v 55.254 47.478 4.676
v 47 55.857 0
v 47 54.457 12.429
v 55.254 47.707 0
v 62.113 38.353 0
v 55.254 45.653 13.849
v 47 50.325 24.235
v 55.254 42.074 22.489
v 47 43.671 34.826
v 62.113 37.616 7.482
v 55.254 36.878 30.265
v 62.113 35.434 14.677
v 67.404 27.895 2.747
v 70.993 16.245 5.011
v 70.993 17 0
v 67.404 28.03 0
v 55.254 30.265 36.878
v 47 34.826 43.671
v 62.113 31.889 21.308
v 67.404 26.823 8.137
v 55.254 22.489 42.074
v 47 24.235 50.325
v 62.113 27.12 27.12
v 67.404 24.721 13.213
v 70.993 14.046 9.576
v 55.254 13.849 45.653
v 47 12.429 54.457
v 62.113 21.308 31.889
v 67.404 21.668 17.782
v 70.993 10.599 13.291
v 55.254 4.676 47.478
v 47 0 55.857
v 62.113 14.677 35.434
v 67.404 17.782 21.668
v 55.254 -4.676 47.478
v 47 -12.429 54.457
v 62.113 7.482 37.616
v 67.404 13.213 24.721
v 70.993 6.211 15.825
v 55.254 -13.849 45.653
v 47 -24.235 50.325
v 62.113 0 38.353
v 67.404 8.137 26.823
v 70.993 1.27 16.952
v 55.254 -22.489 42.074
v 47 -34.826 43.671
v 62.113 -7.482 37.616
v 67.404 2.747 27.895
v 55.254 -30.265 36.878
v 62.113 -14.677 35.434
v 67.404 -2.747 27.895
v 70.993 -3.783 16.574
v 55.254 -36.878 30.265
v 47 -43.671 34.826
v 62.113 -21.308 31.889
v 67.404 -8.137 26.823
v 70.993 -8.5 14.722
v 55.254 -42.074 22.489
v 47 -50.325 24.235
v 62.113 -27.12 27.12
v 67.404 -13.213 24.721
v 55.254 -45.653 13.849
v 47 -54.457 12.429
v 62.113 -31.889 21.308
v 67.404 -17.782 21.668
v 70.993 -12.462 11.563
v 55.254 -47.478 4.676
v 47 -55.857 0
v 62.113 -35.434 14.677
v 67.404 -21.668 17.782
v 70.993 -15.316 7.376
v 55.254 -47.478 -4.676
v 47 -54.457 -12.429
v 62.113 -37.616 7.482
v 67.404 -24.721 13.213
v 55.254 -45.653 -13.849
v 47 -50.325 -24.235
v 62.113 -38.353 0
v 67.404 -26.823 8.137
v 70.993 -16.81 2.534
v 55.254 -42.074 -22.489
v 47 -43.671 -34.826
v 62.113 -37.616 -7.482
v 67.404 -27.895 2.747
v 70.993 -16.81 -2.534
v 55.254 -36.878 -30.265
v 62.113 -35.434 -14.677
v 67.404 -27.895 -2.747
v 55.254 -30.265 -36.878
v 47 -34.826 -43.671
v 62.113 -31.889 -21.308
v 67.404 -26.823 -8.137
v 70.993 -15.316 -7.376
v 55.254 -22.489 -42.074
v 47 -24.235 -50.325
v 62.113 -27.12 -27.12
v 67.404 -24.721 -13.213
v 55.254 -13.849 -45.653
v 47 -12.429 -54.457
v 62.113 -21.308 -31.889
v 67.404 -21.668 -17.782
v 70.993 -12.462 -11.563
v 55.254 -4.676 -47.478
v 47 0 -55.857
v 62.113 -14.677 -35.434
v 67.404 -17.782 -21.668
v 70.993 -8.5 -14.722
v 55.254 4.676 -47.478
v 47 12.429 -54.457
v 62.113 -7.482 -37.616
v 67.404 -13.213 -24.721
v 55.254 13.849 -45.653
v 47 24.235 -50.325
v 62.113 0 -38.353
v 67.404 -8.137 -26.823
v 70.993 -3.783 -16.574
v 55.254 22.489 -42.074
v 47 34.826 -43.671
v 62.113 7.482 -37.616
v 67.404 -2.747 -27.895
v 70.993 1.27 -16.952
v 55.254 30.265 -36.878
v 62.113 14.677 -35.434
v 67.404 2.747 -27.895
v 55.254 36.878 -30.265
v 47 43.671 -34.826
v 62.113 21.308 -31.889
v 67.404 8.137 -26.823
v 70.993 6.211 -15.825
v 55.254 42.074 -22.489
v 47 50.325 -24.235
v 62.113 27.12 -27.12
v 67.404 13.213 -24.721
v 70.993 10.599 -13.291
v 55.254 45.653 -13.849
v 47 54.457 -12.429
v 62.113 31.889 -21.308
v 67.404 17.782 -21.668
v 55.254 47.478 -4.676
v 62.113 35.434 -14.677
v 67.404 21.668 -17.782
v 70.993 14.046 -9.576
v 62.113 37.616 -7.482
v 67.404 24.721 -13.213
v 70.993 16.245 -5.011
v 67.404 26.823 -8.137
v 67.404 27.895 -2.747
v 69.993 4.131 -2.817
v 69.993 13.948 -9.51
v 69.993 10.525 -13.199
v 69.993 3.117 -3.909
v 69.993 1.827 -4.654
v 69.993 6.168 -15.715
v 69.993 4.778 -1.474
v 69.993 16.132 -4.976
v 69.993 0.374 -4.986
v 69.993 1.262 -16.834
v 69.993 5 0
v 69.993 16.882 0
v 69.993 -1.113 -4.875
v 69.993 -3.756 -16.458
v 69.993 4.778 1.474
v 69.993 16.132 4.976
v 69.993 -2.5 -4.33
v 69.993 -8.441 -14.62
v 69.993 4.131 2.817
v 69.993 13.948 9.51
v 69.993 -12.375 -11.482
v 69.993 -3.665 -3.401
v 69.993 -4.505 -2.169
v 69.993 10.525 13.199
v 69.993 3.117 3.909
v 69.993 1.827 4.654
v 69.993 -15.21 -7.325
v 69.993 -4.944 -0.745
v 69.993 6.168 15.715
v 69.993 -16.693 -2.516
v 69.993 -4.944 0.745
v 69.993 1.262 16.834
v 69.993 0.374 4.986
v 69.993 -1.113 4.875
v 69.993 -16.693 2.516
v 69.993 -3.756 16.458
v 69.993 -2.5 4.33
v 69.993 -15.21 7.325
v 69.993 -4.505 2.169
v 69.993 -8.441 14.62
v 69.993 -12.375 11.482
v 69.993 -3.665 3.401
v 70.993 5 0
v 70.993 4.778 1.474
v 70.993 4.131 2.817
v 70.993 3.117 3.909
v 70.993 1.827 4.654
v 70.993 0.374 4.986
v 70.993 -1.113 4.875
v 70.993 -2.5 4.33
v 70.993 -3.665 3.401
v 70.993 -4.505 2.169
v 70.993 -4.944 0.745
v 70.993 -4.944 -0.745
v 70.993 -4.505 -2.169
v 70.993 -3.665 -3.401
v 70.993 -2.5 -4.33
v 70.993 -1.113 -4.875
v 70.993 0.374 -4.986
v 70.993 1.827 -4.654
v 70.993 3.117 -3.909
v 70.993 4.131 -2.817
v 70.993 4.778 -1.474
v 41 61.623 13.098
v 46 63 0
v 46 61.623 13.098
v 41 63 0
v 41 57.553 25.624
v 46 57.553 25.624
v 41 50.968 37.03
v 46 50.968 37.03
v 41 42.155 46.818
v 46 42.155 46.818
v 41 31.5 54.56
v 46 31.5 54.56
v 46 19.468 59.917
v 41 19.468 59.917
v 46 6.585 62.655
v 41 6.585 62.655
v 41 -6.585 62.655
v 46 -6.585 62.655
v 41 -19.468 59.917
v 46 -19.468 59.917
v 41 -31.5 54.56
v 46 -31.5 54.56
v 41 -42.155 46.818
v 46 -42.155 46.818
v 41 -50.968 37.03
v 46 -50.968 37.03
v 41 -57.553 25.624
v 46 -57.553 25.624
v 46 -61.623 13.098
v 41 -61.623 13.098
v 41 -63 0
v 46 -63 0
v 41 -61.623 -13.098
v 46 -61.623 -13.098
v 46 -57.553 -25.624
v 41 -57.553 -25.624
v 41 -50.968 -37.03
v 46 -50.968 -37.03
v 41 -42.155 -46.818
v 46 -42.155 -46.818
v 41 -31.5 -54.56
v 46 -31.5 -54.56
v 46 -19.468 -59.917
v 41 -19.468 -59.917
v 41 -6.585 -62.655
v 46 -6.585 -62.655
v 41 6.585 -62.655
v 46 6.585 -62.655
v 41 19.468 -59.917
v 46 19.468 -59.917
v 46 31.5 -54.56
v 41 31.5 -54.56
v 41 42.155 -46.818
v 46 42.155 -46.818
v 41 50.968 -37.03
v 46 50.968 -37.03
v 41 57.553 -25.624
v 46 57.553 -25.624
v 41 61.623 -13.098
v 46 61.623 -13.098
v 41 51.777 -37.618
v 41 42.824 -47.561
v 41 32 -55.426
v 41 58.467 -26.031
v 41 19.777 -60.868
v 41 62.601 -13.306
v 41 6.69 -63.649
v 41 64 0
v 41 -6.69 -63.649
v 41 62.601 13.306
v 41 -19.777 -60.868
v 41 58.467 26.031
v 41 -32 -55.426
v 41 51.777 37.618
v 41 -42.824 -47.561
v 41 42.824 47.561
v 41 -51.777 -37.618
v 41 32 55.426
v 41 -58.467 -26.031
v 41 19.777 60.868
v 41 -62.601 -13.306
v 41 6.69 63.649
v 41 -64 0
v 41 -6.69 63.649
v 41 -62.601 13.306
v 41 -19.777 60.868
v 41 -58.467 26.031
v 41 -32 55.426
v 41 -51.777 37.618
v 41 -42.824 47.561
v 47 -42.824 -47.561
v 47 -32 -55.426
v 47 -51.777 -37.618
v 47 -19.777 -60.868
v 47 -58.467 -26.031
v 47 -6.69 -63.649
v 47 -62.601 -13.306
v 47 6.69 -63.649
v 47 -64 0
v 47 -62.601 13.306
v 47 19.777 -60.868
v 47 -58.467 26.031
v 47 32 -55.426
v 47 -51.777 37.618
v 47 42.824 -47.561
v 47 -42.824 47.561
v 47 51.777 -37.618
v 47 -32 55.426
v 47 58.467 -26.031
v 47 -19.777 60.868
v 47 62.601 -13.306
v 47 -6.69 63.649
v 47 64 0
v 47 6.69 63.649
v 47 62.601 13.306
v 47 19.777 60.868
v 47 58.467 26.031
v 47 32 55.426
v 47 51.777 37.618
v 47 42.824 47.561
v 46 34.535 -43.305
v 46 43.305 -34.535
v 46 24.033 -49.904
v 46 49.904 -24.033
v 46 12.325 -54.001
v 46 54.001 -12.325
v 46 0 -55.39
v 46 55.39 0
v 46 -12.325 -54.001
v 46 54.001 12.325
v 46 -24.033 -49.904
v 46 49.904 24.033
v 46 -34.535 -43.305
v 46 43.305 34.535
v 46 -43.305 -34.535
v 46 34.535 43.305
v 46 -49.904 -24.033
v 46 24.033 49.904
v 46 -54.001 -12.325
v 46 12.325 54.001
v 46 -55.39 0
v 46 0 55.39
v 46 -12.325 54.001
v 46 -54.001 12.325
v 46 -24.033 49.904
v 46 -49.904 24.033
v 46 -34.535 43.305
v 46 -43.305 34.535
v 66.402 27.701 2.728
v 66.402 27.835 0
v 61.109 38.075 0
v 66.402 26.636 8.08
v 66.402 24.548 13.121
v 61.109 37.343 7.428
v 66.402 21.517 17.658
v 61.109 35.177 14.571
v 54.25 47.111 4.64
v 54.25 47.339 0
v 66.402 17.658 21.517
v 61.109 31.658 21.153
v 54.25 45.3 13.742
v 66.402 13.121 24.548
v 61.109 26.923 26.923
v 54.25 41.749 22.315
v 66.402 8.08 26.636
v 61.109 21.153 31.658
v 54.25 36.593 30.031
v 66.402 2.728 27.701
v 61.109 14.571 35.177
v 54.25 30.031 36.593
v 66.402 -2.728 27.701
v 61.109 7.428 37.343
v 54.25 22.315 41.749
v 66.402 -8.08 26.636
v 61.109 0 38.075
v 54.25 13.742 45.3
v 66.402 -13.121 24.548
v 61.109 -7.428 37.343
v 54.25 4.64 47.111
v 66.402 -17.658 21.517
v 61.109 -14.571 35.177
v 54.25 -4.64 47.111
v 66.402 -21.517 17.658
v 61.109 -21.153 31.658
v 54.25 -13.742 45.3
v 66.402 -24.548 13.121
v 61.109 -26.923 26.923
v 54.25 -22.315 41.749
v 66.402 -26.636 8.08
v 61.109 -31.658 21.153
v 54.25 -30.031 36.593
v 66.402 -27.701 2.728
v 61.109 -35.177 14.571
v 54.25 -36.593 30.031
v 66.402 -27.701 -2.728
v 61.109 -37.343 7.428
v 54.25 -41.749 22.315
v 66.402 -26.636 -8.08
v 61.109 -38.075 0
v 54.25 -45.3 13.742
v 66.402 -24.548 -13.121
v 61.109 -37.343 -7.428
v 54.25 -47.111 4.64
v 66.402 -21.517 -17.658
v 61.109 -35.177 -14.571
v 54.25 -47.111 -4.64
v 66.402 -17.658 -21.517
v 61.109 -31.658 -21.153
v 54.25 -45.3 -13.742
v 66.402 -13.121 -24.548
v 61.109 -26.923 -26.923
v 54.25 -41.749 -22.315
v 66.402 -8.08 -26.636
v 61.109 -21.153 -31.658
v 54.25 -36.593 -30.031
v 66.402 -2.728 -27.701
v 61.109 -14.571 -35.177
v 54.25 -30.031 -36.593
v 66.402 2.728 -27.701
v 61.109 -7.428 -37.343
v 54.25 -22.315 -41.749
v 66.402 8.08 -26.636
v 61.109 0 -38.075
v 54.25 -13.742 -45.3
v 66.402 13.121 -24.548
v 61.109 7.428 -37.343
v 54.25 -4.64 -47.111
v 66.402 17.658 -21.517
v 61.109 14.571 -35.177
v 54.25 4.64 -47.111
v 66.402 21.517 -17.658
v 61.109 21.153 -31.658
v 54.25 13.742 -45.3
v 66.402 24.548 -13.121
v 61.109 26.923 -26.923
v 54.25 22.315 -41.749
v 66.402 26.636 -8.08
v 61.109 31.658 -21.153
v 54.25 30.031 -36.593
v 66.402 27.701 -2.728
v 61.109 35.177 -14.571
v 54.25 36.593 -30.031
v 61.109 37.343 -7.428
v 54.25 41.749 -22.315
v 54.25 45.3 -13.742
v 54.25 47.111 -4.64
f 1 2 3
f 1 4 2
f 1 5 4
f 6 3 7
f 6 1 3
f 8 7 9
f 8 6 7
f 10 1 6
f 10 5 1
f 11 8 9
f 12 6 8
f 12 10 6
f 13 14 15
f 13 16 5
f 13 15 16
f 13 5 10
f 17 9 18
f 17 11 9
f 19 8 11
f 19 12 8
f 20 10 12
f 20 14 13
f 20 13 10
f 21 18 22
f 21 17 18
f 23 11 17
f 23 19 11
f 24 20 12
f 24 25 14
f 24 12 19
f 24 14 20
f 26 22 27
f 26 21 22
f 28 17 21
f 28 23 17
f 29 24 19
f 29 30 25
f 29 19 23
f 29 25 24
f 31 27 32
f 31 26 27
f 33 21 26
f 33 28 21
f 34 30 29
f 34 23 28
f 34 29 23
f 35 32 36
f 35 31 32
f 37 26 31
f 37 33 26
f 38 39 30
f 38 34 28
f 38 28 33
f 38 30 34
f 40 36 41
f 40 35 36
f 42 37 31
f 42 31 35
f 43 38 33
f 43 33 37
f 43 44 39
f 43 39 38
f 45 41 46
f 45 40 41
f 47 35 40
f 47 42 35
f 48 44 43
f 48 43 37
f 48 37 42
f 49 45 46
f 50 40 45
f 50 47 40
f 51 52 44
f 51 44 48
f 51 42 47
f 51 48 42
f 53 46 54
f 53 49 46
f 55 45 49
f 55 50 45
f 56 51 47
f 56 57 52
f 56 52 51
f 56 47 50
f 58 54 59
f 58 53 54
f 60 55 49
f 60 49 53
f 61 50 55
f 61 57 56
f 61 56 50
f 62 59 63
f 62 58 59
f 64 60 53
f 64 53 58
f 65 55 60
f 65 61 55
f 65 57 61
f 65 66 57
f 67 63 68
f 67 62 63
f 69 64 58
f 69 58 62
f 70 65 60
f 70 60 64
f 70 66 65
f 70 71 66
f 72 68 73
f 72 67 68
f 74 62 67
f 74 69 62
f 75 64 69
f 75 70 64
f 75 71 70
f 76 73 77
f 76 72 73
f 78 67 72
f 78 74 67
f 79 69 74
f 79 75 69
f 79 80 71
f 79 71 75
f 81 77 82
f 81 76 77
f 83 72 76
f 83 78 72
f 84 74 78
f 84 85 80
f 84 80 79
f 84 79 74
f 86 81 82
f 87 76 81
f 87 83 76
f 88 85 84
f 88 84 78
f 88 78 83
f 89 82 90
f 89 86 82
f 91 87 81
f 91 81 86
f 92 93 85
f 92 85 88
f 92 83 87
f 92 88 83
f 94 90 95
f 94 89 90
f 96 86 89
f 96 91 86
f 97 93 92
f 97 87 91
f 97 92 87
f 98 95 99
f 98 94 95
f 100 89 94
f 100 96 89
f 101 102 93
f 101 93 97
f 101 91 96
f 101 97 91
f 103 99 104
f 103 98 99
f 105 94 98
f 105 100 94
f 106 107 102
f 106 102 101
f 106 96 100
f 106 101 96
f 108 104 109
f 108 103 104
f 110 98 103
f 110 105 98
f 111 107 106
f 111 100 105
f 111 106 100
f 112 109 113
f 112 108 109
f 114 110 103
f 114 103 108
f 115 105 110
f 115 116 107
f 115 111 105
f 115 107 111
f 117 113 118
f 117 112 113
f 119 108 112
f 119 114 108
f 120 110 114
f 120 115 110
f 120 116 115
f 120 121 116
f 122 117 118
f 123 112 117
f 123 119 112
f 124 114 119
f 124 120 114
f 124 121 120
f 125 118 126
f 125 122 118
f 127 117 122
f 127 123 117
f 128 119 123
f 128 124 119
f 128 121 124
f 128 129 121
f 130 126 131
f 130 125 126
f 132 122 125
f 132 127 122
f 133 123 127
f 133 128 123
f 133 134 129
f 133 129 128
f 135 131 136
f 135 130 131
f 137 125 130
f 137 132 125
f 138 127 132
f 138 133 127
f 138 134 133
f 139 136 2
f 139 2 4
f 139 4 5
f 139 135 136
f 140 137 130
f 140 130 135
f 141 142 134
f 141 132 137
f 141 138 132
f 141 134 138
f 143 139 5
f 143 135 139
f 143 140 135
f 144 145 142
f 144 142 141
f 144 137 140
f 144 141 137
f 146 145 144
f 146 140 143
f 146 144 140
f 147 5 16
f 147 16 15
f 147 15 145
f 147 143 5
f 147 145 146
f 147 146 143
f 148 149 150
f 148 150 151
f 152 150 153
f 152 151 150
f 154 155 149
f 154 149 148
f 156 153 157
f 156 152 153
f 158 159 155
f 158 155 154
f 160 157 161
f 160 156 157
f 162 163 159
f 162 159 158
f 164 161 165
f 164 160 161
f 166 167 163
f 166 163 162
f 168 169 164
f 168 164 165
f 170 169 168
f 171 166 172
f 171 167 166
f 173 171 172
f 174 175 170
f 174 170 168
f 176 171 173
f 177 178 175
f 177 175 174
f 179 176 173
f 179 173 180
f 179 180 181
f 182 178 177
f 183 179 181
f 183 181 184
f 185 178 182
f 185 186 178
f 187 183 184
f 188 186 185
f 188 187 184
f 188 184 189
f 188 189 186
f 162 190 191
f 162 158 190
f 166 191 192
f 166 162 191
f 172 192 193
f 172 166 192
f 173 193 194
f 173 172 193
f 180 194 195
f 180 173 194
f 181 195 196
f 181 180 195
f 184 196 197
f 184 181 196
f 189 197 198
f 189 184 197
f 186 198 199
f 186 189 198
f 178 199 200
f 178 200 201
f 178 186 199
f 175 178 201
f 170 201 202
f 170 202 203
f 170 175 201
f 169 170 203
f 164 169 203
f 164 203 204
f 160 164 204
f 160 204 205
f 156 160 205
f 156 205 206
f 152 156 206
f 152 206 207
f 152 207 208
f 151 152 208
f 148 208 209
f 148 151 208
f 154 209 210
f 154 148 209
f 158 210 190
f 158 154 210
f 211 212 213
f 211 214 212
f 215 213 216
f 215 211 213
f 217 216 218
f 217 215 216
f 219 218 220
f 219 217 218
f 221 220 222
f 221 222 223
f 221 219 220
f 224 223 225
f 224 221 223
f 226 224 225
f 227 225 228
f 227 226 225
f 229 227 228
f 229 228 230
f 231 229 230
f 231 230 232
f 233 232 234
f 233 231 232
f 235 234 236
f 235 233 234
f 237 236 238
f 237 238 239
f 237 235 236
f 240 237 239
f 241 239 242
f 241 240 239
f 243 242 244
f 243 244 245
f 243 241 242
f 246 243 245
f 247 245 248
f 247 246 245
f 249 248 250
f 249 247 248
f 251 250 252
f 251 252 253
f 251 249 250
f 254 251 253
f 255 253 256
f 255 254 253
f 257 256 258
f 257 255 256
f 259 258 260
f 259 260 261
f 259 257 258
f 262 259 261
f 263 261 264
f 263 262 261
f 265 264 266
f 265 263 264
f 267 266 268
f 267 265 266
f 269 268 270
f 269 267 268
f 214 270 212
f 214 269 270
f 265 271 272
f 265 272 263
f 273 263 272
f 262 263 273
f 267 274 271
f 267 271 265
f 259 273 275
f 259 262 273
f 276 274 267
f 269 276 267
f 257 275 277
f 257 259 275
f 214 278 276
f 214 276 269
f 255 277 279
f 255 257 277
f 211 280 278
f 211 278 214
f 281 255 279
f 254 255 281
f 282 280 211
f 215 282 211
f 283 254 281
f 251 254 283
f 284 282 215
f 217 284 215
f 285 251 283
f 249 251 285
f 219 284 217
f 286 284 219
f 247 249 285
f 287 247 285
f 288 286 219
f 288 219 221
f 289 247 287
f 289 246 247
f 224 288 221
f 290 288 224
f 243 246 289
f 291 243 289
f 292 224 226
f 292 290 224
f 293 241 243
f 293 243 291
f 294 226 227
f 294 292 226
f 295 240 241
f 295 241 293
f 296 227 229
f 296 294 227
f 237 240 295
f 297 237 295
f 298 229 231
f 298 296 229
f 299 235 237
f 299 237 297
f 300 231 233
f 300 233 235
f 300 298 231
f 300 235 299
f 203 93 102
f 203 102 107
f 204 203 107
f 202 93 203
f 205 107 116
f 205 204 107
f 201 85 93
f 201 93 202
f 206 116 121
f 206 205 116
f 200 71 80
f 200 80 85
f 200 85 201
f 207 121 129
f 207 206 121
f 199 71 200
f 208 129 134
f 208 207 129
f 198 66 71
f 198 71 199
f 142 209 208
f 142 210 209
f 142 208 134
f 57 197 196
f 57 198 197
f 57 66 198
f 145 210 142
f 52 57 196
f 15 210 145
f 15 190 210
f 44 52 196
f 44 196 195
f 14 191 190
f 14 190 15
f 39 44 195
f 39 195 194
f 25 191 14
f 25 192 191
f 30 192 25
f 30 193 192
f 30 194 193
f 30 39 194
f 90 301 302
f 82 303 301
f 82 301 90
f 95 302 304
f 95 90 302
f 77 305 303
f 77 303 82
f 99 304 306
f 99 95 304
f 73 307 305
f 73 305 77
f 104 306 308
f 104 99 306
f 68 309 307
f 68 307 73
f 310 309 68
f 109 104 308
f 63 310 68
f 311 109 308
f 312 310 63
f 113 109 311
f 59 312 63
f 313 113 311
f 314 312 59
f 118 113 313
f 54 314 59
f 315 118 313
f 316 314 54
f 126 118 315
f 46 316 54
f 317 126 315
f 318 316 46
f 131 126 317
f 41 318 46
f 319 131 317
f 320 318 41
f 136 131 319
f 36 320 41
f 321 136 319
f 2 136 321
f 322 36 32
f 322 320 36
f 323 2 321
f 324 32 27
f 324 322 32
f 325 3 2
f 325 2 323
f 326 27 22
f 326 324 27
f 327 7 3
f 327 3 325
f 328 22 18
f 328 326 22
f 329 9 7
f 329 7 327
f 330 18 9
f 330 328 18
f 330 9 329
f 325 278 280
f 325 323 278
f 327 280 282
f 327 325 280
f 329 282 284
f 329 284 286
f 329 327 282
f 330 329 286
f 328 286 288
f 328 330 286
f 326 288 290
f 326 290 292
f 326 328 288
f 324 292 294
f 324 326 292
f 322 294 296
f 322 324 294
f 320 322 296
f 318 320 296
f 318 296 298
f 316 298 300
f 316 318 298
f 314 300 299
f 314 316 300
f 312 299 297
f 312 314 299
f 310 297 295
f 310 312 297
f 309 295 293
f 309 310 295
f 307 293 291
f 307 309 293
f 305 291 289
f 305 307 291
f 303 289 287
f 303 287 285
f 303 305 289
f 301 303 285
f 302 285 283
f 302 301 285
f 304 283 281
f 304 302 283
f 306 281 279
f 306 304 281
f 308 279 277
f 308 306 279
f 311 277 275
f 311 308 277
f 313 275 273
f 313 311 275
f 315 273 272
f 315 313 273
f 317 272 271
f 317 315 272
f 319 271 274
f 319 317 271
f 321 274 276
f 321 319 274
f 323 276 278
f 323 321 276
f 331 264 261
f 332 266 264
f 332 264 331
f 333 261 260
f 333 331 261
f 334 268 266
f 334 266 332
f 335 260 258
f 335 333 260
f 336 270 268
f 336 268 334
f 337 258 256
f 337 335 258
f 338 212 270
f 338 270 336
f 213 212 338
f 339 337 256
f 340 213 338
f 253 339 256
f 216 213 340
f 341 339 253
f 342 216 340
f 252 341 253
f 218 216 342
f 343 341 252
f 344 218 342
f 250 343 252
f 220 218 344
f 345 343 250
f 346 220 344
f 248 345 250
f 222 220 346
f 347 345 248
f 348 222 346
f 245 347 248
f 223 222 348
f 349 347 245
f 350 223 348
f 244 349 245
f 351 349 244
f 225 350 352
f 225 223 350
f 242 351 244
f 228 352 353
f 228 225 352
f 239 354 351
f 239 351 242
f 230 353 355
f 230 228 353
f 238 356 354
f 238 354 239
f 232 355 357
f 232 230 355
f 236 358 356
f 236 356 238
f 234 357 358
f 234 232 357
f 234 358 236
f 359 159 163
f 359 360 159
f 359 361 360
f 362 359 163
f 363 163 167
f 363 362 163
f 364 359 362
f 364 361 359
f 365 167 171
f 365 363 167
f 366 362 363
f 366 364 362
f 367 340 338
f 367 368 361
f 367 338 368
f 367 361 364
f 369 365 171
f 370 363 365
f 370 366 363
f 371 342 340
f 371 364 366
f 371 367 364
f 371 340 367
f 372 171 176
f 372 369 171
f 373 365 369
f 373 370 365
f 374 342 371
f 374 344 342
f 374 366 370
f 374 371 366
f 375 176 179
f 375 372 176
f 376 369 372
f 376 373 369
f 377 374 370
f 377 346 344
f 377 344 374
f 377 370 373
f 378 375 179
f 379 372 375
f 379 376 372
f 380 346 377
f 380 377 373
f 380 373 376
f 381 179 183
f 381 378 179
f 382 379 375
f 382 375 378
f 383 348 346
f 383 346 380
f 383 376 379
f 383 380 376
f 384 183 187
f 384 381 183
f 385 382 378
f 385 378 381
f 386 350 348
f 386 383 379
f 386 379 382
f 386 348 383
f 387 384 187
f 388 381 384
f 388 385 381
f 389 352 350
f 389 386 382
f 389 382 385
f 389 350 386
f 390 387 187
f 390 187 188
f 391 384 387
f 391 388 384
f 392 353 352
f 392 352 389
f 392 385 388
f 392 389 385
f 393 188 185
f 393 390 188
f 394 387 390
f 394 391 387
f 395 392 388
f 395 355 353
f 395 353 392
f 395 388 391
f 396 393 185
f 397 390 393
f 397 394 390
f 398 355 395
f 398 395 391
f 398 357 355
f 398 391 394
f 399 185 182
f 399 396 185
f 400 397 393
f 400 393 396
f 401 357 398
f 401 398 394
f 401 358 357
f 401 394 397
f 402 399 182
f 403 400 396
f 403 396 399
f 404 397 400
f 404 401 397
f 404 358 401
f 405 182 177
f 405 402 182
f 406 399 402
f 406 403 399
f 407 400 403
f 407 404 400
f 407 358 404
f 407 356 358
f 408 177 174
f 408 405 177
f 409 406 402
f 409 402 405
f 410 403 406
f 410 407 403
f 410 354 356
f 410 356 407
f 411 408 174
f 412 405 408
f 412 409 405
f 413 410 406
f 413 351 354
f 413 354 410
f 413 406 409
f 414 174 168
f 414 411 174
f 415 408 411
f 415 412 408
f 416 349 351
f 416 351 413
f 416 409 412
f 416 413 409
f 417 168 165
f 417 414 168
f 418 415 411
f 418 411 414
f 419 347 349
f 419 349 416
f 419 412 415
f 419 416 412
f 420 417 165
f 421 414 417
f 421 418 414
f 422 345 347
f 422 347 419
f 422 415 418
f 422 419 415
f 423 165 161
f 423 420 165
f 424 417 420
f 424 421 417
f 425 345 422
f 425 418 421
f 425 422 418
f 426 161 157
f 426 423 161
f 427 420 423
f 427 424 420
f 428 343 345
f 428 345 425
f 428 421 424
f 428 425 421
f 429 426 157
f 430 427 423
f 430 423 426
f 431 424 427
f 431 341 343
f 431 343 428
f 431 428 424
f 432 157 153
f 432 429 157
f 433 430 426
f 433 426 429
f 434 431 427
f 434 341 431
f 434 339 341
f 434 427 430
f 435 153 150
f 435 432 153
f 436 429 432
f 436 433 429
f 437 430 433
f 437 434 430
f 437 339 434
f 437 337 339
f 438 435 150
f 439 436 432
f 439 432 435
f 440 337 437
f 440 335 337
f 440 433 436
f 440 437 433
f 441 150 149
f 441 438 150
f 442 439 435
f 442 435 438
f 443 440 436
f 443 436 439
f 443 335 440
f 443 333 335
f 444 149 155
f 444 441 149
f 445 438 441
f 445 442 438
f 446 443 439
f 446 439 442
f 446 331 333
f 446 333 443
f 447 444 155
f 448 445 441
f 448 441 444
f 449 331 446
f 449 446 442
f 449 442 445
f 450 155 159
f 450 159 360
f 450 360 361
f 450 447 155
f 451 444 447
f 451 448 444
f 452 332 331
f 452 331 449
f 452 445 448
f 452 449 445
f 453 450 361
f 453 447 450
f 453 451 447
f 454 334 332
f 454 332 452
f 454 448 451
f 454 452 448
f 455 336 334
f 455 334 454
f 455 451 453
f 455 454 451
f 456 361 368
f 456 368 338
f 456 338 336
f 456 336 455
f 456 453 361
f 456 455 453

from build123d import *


with BuildPart() as part:
    # Sketch1 → Revolve1 (revolve)
    with BuildSketch(Plane.XY):
        with BuildLine():
            Line((41, 64), (47, 64))
            Line((47, 64), (47, 55.856960175))
            ThreePointArc((47, 55.856960175), (62.113205821, 38.352961589), (70.992957397, 17))
            Line((70.992957397, 17), (70.992957397, 5))
            Line((70.992957397, 5), (69.992957397, 5))
            Line((69.992957397, 5), (69.992957397, 16.881525843))
            ThreePointArc((69.992957397, 16.881525843), (61.108985686, 38.074819348), (46, 55.389529697))
            Line((46, 55.389529697), (46, 63))
            Line((46, 63), (41, 63))
            Line((41, 63), (41, 64))
        make_face()
    revolve(axis=Axis((0, 0, 0), (1, 0, 0)))


solid = part.part
